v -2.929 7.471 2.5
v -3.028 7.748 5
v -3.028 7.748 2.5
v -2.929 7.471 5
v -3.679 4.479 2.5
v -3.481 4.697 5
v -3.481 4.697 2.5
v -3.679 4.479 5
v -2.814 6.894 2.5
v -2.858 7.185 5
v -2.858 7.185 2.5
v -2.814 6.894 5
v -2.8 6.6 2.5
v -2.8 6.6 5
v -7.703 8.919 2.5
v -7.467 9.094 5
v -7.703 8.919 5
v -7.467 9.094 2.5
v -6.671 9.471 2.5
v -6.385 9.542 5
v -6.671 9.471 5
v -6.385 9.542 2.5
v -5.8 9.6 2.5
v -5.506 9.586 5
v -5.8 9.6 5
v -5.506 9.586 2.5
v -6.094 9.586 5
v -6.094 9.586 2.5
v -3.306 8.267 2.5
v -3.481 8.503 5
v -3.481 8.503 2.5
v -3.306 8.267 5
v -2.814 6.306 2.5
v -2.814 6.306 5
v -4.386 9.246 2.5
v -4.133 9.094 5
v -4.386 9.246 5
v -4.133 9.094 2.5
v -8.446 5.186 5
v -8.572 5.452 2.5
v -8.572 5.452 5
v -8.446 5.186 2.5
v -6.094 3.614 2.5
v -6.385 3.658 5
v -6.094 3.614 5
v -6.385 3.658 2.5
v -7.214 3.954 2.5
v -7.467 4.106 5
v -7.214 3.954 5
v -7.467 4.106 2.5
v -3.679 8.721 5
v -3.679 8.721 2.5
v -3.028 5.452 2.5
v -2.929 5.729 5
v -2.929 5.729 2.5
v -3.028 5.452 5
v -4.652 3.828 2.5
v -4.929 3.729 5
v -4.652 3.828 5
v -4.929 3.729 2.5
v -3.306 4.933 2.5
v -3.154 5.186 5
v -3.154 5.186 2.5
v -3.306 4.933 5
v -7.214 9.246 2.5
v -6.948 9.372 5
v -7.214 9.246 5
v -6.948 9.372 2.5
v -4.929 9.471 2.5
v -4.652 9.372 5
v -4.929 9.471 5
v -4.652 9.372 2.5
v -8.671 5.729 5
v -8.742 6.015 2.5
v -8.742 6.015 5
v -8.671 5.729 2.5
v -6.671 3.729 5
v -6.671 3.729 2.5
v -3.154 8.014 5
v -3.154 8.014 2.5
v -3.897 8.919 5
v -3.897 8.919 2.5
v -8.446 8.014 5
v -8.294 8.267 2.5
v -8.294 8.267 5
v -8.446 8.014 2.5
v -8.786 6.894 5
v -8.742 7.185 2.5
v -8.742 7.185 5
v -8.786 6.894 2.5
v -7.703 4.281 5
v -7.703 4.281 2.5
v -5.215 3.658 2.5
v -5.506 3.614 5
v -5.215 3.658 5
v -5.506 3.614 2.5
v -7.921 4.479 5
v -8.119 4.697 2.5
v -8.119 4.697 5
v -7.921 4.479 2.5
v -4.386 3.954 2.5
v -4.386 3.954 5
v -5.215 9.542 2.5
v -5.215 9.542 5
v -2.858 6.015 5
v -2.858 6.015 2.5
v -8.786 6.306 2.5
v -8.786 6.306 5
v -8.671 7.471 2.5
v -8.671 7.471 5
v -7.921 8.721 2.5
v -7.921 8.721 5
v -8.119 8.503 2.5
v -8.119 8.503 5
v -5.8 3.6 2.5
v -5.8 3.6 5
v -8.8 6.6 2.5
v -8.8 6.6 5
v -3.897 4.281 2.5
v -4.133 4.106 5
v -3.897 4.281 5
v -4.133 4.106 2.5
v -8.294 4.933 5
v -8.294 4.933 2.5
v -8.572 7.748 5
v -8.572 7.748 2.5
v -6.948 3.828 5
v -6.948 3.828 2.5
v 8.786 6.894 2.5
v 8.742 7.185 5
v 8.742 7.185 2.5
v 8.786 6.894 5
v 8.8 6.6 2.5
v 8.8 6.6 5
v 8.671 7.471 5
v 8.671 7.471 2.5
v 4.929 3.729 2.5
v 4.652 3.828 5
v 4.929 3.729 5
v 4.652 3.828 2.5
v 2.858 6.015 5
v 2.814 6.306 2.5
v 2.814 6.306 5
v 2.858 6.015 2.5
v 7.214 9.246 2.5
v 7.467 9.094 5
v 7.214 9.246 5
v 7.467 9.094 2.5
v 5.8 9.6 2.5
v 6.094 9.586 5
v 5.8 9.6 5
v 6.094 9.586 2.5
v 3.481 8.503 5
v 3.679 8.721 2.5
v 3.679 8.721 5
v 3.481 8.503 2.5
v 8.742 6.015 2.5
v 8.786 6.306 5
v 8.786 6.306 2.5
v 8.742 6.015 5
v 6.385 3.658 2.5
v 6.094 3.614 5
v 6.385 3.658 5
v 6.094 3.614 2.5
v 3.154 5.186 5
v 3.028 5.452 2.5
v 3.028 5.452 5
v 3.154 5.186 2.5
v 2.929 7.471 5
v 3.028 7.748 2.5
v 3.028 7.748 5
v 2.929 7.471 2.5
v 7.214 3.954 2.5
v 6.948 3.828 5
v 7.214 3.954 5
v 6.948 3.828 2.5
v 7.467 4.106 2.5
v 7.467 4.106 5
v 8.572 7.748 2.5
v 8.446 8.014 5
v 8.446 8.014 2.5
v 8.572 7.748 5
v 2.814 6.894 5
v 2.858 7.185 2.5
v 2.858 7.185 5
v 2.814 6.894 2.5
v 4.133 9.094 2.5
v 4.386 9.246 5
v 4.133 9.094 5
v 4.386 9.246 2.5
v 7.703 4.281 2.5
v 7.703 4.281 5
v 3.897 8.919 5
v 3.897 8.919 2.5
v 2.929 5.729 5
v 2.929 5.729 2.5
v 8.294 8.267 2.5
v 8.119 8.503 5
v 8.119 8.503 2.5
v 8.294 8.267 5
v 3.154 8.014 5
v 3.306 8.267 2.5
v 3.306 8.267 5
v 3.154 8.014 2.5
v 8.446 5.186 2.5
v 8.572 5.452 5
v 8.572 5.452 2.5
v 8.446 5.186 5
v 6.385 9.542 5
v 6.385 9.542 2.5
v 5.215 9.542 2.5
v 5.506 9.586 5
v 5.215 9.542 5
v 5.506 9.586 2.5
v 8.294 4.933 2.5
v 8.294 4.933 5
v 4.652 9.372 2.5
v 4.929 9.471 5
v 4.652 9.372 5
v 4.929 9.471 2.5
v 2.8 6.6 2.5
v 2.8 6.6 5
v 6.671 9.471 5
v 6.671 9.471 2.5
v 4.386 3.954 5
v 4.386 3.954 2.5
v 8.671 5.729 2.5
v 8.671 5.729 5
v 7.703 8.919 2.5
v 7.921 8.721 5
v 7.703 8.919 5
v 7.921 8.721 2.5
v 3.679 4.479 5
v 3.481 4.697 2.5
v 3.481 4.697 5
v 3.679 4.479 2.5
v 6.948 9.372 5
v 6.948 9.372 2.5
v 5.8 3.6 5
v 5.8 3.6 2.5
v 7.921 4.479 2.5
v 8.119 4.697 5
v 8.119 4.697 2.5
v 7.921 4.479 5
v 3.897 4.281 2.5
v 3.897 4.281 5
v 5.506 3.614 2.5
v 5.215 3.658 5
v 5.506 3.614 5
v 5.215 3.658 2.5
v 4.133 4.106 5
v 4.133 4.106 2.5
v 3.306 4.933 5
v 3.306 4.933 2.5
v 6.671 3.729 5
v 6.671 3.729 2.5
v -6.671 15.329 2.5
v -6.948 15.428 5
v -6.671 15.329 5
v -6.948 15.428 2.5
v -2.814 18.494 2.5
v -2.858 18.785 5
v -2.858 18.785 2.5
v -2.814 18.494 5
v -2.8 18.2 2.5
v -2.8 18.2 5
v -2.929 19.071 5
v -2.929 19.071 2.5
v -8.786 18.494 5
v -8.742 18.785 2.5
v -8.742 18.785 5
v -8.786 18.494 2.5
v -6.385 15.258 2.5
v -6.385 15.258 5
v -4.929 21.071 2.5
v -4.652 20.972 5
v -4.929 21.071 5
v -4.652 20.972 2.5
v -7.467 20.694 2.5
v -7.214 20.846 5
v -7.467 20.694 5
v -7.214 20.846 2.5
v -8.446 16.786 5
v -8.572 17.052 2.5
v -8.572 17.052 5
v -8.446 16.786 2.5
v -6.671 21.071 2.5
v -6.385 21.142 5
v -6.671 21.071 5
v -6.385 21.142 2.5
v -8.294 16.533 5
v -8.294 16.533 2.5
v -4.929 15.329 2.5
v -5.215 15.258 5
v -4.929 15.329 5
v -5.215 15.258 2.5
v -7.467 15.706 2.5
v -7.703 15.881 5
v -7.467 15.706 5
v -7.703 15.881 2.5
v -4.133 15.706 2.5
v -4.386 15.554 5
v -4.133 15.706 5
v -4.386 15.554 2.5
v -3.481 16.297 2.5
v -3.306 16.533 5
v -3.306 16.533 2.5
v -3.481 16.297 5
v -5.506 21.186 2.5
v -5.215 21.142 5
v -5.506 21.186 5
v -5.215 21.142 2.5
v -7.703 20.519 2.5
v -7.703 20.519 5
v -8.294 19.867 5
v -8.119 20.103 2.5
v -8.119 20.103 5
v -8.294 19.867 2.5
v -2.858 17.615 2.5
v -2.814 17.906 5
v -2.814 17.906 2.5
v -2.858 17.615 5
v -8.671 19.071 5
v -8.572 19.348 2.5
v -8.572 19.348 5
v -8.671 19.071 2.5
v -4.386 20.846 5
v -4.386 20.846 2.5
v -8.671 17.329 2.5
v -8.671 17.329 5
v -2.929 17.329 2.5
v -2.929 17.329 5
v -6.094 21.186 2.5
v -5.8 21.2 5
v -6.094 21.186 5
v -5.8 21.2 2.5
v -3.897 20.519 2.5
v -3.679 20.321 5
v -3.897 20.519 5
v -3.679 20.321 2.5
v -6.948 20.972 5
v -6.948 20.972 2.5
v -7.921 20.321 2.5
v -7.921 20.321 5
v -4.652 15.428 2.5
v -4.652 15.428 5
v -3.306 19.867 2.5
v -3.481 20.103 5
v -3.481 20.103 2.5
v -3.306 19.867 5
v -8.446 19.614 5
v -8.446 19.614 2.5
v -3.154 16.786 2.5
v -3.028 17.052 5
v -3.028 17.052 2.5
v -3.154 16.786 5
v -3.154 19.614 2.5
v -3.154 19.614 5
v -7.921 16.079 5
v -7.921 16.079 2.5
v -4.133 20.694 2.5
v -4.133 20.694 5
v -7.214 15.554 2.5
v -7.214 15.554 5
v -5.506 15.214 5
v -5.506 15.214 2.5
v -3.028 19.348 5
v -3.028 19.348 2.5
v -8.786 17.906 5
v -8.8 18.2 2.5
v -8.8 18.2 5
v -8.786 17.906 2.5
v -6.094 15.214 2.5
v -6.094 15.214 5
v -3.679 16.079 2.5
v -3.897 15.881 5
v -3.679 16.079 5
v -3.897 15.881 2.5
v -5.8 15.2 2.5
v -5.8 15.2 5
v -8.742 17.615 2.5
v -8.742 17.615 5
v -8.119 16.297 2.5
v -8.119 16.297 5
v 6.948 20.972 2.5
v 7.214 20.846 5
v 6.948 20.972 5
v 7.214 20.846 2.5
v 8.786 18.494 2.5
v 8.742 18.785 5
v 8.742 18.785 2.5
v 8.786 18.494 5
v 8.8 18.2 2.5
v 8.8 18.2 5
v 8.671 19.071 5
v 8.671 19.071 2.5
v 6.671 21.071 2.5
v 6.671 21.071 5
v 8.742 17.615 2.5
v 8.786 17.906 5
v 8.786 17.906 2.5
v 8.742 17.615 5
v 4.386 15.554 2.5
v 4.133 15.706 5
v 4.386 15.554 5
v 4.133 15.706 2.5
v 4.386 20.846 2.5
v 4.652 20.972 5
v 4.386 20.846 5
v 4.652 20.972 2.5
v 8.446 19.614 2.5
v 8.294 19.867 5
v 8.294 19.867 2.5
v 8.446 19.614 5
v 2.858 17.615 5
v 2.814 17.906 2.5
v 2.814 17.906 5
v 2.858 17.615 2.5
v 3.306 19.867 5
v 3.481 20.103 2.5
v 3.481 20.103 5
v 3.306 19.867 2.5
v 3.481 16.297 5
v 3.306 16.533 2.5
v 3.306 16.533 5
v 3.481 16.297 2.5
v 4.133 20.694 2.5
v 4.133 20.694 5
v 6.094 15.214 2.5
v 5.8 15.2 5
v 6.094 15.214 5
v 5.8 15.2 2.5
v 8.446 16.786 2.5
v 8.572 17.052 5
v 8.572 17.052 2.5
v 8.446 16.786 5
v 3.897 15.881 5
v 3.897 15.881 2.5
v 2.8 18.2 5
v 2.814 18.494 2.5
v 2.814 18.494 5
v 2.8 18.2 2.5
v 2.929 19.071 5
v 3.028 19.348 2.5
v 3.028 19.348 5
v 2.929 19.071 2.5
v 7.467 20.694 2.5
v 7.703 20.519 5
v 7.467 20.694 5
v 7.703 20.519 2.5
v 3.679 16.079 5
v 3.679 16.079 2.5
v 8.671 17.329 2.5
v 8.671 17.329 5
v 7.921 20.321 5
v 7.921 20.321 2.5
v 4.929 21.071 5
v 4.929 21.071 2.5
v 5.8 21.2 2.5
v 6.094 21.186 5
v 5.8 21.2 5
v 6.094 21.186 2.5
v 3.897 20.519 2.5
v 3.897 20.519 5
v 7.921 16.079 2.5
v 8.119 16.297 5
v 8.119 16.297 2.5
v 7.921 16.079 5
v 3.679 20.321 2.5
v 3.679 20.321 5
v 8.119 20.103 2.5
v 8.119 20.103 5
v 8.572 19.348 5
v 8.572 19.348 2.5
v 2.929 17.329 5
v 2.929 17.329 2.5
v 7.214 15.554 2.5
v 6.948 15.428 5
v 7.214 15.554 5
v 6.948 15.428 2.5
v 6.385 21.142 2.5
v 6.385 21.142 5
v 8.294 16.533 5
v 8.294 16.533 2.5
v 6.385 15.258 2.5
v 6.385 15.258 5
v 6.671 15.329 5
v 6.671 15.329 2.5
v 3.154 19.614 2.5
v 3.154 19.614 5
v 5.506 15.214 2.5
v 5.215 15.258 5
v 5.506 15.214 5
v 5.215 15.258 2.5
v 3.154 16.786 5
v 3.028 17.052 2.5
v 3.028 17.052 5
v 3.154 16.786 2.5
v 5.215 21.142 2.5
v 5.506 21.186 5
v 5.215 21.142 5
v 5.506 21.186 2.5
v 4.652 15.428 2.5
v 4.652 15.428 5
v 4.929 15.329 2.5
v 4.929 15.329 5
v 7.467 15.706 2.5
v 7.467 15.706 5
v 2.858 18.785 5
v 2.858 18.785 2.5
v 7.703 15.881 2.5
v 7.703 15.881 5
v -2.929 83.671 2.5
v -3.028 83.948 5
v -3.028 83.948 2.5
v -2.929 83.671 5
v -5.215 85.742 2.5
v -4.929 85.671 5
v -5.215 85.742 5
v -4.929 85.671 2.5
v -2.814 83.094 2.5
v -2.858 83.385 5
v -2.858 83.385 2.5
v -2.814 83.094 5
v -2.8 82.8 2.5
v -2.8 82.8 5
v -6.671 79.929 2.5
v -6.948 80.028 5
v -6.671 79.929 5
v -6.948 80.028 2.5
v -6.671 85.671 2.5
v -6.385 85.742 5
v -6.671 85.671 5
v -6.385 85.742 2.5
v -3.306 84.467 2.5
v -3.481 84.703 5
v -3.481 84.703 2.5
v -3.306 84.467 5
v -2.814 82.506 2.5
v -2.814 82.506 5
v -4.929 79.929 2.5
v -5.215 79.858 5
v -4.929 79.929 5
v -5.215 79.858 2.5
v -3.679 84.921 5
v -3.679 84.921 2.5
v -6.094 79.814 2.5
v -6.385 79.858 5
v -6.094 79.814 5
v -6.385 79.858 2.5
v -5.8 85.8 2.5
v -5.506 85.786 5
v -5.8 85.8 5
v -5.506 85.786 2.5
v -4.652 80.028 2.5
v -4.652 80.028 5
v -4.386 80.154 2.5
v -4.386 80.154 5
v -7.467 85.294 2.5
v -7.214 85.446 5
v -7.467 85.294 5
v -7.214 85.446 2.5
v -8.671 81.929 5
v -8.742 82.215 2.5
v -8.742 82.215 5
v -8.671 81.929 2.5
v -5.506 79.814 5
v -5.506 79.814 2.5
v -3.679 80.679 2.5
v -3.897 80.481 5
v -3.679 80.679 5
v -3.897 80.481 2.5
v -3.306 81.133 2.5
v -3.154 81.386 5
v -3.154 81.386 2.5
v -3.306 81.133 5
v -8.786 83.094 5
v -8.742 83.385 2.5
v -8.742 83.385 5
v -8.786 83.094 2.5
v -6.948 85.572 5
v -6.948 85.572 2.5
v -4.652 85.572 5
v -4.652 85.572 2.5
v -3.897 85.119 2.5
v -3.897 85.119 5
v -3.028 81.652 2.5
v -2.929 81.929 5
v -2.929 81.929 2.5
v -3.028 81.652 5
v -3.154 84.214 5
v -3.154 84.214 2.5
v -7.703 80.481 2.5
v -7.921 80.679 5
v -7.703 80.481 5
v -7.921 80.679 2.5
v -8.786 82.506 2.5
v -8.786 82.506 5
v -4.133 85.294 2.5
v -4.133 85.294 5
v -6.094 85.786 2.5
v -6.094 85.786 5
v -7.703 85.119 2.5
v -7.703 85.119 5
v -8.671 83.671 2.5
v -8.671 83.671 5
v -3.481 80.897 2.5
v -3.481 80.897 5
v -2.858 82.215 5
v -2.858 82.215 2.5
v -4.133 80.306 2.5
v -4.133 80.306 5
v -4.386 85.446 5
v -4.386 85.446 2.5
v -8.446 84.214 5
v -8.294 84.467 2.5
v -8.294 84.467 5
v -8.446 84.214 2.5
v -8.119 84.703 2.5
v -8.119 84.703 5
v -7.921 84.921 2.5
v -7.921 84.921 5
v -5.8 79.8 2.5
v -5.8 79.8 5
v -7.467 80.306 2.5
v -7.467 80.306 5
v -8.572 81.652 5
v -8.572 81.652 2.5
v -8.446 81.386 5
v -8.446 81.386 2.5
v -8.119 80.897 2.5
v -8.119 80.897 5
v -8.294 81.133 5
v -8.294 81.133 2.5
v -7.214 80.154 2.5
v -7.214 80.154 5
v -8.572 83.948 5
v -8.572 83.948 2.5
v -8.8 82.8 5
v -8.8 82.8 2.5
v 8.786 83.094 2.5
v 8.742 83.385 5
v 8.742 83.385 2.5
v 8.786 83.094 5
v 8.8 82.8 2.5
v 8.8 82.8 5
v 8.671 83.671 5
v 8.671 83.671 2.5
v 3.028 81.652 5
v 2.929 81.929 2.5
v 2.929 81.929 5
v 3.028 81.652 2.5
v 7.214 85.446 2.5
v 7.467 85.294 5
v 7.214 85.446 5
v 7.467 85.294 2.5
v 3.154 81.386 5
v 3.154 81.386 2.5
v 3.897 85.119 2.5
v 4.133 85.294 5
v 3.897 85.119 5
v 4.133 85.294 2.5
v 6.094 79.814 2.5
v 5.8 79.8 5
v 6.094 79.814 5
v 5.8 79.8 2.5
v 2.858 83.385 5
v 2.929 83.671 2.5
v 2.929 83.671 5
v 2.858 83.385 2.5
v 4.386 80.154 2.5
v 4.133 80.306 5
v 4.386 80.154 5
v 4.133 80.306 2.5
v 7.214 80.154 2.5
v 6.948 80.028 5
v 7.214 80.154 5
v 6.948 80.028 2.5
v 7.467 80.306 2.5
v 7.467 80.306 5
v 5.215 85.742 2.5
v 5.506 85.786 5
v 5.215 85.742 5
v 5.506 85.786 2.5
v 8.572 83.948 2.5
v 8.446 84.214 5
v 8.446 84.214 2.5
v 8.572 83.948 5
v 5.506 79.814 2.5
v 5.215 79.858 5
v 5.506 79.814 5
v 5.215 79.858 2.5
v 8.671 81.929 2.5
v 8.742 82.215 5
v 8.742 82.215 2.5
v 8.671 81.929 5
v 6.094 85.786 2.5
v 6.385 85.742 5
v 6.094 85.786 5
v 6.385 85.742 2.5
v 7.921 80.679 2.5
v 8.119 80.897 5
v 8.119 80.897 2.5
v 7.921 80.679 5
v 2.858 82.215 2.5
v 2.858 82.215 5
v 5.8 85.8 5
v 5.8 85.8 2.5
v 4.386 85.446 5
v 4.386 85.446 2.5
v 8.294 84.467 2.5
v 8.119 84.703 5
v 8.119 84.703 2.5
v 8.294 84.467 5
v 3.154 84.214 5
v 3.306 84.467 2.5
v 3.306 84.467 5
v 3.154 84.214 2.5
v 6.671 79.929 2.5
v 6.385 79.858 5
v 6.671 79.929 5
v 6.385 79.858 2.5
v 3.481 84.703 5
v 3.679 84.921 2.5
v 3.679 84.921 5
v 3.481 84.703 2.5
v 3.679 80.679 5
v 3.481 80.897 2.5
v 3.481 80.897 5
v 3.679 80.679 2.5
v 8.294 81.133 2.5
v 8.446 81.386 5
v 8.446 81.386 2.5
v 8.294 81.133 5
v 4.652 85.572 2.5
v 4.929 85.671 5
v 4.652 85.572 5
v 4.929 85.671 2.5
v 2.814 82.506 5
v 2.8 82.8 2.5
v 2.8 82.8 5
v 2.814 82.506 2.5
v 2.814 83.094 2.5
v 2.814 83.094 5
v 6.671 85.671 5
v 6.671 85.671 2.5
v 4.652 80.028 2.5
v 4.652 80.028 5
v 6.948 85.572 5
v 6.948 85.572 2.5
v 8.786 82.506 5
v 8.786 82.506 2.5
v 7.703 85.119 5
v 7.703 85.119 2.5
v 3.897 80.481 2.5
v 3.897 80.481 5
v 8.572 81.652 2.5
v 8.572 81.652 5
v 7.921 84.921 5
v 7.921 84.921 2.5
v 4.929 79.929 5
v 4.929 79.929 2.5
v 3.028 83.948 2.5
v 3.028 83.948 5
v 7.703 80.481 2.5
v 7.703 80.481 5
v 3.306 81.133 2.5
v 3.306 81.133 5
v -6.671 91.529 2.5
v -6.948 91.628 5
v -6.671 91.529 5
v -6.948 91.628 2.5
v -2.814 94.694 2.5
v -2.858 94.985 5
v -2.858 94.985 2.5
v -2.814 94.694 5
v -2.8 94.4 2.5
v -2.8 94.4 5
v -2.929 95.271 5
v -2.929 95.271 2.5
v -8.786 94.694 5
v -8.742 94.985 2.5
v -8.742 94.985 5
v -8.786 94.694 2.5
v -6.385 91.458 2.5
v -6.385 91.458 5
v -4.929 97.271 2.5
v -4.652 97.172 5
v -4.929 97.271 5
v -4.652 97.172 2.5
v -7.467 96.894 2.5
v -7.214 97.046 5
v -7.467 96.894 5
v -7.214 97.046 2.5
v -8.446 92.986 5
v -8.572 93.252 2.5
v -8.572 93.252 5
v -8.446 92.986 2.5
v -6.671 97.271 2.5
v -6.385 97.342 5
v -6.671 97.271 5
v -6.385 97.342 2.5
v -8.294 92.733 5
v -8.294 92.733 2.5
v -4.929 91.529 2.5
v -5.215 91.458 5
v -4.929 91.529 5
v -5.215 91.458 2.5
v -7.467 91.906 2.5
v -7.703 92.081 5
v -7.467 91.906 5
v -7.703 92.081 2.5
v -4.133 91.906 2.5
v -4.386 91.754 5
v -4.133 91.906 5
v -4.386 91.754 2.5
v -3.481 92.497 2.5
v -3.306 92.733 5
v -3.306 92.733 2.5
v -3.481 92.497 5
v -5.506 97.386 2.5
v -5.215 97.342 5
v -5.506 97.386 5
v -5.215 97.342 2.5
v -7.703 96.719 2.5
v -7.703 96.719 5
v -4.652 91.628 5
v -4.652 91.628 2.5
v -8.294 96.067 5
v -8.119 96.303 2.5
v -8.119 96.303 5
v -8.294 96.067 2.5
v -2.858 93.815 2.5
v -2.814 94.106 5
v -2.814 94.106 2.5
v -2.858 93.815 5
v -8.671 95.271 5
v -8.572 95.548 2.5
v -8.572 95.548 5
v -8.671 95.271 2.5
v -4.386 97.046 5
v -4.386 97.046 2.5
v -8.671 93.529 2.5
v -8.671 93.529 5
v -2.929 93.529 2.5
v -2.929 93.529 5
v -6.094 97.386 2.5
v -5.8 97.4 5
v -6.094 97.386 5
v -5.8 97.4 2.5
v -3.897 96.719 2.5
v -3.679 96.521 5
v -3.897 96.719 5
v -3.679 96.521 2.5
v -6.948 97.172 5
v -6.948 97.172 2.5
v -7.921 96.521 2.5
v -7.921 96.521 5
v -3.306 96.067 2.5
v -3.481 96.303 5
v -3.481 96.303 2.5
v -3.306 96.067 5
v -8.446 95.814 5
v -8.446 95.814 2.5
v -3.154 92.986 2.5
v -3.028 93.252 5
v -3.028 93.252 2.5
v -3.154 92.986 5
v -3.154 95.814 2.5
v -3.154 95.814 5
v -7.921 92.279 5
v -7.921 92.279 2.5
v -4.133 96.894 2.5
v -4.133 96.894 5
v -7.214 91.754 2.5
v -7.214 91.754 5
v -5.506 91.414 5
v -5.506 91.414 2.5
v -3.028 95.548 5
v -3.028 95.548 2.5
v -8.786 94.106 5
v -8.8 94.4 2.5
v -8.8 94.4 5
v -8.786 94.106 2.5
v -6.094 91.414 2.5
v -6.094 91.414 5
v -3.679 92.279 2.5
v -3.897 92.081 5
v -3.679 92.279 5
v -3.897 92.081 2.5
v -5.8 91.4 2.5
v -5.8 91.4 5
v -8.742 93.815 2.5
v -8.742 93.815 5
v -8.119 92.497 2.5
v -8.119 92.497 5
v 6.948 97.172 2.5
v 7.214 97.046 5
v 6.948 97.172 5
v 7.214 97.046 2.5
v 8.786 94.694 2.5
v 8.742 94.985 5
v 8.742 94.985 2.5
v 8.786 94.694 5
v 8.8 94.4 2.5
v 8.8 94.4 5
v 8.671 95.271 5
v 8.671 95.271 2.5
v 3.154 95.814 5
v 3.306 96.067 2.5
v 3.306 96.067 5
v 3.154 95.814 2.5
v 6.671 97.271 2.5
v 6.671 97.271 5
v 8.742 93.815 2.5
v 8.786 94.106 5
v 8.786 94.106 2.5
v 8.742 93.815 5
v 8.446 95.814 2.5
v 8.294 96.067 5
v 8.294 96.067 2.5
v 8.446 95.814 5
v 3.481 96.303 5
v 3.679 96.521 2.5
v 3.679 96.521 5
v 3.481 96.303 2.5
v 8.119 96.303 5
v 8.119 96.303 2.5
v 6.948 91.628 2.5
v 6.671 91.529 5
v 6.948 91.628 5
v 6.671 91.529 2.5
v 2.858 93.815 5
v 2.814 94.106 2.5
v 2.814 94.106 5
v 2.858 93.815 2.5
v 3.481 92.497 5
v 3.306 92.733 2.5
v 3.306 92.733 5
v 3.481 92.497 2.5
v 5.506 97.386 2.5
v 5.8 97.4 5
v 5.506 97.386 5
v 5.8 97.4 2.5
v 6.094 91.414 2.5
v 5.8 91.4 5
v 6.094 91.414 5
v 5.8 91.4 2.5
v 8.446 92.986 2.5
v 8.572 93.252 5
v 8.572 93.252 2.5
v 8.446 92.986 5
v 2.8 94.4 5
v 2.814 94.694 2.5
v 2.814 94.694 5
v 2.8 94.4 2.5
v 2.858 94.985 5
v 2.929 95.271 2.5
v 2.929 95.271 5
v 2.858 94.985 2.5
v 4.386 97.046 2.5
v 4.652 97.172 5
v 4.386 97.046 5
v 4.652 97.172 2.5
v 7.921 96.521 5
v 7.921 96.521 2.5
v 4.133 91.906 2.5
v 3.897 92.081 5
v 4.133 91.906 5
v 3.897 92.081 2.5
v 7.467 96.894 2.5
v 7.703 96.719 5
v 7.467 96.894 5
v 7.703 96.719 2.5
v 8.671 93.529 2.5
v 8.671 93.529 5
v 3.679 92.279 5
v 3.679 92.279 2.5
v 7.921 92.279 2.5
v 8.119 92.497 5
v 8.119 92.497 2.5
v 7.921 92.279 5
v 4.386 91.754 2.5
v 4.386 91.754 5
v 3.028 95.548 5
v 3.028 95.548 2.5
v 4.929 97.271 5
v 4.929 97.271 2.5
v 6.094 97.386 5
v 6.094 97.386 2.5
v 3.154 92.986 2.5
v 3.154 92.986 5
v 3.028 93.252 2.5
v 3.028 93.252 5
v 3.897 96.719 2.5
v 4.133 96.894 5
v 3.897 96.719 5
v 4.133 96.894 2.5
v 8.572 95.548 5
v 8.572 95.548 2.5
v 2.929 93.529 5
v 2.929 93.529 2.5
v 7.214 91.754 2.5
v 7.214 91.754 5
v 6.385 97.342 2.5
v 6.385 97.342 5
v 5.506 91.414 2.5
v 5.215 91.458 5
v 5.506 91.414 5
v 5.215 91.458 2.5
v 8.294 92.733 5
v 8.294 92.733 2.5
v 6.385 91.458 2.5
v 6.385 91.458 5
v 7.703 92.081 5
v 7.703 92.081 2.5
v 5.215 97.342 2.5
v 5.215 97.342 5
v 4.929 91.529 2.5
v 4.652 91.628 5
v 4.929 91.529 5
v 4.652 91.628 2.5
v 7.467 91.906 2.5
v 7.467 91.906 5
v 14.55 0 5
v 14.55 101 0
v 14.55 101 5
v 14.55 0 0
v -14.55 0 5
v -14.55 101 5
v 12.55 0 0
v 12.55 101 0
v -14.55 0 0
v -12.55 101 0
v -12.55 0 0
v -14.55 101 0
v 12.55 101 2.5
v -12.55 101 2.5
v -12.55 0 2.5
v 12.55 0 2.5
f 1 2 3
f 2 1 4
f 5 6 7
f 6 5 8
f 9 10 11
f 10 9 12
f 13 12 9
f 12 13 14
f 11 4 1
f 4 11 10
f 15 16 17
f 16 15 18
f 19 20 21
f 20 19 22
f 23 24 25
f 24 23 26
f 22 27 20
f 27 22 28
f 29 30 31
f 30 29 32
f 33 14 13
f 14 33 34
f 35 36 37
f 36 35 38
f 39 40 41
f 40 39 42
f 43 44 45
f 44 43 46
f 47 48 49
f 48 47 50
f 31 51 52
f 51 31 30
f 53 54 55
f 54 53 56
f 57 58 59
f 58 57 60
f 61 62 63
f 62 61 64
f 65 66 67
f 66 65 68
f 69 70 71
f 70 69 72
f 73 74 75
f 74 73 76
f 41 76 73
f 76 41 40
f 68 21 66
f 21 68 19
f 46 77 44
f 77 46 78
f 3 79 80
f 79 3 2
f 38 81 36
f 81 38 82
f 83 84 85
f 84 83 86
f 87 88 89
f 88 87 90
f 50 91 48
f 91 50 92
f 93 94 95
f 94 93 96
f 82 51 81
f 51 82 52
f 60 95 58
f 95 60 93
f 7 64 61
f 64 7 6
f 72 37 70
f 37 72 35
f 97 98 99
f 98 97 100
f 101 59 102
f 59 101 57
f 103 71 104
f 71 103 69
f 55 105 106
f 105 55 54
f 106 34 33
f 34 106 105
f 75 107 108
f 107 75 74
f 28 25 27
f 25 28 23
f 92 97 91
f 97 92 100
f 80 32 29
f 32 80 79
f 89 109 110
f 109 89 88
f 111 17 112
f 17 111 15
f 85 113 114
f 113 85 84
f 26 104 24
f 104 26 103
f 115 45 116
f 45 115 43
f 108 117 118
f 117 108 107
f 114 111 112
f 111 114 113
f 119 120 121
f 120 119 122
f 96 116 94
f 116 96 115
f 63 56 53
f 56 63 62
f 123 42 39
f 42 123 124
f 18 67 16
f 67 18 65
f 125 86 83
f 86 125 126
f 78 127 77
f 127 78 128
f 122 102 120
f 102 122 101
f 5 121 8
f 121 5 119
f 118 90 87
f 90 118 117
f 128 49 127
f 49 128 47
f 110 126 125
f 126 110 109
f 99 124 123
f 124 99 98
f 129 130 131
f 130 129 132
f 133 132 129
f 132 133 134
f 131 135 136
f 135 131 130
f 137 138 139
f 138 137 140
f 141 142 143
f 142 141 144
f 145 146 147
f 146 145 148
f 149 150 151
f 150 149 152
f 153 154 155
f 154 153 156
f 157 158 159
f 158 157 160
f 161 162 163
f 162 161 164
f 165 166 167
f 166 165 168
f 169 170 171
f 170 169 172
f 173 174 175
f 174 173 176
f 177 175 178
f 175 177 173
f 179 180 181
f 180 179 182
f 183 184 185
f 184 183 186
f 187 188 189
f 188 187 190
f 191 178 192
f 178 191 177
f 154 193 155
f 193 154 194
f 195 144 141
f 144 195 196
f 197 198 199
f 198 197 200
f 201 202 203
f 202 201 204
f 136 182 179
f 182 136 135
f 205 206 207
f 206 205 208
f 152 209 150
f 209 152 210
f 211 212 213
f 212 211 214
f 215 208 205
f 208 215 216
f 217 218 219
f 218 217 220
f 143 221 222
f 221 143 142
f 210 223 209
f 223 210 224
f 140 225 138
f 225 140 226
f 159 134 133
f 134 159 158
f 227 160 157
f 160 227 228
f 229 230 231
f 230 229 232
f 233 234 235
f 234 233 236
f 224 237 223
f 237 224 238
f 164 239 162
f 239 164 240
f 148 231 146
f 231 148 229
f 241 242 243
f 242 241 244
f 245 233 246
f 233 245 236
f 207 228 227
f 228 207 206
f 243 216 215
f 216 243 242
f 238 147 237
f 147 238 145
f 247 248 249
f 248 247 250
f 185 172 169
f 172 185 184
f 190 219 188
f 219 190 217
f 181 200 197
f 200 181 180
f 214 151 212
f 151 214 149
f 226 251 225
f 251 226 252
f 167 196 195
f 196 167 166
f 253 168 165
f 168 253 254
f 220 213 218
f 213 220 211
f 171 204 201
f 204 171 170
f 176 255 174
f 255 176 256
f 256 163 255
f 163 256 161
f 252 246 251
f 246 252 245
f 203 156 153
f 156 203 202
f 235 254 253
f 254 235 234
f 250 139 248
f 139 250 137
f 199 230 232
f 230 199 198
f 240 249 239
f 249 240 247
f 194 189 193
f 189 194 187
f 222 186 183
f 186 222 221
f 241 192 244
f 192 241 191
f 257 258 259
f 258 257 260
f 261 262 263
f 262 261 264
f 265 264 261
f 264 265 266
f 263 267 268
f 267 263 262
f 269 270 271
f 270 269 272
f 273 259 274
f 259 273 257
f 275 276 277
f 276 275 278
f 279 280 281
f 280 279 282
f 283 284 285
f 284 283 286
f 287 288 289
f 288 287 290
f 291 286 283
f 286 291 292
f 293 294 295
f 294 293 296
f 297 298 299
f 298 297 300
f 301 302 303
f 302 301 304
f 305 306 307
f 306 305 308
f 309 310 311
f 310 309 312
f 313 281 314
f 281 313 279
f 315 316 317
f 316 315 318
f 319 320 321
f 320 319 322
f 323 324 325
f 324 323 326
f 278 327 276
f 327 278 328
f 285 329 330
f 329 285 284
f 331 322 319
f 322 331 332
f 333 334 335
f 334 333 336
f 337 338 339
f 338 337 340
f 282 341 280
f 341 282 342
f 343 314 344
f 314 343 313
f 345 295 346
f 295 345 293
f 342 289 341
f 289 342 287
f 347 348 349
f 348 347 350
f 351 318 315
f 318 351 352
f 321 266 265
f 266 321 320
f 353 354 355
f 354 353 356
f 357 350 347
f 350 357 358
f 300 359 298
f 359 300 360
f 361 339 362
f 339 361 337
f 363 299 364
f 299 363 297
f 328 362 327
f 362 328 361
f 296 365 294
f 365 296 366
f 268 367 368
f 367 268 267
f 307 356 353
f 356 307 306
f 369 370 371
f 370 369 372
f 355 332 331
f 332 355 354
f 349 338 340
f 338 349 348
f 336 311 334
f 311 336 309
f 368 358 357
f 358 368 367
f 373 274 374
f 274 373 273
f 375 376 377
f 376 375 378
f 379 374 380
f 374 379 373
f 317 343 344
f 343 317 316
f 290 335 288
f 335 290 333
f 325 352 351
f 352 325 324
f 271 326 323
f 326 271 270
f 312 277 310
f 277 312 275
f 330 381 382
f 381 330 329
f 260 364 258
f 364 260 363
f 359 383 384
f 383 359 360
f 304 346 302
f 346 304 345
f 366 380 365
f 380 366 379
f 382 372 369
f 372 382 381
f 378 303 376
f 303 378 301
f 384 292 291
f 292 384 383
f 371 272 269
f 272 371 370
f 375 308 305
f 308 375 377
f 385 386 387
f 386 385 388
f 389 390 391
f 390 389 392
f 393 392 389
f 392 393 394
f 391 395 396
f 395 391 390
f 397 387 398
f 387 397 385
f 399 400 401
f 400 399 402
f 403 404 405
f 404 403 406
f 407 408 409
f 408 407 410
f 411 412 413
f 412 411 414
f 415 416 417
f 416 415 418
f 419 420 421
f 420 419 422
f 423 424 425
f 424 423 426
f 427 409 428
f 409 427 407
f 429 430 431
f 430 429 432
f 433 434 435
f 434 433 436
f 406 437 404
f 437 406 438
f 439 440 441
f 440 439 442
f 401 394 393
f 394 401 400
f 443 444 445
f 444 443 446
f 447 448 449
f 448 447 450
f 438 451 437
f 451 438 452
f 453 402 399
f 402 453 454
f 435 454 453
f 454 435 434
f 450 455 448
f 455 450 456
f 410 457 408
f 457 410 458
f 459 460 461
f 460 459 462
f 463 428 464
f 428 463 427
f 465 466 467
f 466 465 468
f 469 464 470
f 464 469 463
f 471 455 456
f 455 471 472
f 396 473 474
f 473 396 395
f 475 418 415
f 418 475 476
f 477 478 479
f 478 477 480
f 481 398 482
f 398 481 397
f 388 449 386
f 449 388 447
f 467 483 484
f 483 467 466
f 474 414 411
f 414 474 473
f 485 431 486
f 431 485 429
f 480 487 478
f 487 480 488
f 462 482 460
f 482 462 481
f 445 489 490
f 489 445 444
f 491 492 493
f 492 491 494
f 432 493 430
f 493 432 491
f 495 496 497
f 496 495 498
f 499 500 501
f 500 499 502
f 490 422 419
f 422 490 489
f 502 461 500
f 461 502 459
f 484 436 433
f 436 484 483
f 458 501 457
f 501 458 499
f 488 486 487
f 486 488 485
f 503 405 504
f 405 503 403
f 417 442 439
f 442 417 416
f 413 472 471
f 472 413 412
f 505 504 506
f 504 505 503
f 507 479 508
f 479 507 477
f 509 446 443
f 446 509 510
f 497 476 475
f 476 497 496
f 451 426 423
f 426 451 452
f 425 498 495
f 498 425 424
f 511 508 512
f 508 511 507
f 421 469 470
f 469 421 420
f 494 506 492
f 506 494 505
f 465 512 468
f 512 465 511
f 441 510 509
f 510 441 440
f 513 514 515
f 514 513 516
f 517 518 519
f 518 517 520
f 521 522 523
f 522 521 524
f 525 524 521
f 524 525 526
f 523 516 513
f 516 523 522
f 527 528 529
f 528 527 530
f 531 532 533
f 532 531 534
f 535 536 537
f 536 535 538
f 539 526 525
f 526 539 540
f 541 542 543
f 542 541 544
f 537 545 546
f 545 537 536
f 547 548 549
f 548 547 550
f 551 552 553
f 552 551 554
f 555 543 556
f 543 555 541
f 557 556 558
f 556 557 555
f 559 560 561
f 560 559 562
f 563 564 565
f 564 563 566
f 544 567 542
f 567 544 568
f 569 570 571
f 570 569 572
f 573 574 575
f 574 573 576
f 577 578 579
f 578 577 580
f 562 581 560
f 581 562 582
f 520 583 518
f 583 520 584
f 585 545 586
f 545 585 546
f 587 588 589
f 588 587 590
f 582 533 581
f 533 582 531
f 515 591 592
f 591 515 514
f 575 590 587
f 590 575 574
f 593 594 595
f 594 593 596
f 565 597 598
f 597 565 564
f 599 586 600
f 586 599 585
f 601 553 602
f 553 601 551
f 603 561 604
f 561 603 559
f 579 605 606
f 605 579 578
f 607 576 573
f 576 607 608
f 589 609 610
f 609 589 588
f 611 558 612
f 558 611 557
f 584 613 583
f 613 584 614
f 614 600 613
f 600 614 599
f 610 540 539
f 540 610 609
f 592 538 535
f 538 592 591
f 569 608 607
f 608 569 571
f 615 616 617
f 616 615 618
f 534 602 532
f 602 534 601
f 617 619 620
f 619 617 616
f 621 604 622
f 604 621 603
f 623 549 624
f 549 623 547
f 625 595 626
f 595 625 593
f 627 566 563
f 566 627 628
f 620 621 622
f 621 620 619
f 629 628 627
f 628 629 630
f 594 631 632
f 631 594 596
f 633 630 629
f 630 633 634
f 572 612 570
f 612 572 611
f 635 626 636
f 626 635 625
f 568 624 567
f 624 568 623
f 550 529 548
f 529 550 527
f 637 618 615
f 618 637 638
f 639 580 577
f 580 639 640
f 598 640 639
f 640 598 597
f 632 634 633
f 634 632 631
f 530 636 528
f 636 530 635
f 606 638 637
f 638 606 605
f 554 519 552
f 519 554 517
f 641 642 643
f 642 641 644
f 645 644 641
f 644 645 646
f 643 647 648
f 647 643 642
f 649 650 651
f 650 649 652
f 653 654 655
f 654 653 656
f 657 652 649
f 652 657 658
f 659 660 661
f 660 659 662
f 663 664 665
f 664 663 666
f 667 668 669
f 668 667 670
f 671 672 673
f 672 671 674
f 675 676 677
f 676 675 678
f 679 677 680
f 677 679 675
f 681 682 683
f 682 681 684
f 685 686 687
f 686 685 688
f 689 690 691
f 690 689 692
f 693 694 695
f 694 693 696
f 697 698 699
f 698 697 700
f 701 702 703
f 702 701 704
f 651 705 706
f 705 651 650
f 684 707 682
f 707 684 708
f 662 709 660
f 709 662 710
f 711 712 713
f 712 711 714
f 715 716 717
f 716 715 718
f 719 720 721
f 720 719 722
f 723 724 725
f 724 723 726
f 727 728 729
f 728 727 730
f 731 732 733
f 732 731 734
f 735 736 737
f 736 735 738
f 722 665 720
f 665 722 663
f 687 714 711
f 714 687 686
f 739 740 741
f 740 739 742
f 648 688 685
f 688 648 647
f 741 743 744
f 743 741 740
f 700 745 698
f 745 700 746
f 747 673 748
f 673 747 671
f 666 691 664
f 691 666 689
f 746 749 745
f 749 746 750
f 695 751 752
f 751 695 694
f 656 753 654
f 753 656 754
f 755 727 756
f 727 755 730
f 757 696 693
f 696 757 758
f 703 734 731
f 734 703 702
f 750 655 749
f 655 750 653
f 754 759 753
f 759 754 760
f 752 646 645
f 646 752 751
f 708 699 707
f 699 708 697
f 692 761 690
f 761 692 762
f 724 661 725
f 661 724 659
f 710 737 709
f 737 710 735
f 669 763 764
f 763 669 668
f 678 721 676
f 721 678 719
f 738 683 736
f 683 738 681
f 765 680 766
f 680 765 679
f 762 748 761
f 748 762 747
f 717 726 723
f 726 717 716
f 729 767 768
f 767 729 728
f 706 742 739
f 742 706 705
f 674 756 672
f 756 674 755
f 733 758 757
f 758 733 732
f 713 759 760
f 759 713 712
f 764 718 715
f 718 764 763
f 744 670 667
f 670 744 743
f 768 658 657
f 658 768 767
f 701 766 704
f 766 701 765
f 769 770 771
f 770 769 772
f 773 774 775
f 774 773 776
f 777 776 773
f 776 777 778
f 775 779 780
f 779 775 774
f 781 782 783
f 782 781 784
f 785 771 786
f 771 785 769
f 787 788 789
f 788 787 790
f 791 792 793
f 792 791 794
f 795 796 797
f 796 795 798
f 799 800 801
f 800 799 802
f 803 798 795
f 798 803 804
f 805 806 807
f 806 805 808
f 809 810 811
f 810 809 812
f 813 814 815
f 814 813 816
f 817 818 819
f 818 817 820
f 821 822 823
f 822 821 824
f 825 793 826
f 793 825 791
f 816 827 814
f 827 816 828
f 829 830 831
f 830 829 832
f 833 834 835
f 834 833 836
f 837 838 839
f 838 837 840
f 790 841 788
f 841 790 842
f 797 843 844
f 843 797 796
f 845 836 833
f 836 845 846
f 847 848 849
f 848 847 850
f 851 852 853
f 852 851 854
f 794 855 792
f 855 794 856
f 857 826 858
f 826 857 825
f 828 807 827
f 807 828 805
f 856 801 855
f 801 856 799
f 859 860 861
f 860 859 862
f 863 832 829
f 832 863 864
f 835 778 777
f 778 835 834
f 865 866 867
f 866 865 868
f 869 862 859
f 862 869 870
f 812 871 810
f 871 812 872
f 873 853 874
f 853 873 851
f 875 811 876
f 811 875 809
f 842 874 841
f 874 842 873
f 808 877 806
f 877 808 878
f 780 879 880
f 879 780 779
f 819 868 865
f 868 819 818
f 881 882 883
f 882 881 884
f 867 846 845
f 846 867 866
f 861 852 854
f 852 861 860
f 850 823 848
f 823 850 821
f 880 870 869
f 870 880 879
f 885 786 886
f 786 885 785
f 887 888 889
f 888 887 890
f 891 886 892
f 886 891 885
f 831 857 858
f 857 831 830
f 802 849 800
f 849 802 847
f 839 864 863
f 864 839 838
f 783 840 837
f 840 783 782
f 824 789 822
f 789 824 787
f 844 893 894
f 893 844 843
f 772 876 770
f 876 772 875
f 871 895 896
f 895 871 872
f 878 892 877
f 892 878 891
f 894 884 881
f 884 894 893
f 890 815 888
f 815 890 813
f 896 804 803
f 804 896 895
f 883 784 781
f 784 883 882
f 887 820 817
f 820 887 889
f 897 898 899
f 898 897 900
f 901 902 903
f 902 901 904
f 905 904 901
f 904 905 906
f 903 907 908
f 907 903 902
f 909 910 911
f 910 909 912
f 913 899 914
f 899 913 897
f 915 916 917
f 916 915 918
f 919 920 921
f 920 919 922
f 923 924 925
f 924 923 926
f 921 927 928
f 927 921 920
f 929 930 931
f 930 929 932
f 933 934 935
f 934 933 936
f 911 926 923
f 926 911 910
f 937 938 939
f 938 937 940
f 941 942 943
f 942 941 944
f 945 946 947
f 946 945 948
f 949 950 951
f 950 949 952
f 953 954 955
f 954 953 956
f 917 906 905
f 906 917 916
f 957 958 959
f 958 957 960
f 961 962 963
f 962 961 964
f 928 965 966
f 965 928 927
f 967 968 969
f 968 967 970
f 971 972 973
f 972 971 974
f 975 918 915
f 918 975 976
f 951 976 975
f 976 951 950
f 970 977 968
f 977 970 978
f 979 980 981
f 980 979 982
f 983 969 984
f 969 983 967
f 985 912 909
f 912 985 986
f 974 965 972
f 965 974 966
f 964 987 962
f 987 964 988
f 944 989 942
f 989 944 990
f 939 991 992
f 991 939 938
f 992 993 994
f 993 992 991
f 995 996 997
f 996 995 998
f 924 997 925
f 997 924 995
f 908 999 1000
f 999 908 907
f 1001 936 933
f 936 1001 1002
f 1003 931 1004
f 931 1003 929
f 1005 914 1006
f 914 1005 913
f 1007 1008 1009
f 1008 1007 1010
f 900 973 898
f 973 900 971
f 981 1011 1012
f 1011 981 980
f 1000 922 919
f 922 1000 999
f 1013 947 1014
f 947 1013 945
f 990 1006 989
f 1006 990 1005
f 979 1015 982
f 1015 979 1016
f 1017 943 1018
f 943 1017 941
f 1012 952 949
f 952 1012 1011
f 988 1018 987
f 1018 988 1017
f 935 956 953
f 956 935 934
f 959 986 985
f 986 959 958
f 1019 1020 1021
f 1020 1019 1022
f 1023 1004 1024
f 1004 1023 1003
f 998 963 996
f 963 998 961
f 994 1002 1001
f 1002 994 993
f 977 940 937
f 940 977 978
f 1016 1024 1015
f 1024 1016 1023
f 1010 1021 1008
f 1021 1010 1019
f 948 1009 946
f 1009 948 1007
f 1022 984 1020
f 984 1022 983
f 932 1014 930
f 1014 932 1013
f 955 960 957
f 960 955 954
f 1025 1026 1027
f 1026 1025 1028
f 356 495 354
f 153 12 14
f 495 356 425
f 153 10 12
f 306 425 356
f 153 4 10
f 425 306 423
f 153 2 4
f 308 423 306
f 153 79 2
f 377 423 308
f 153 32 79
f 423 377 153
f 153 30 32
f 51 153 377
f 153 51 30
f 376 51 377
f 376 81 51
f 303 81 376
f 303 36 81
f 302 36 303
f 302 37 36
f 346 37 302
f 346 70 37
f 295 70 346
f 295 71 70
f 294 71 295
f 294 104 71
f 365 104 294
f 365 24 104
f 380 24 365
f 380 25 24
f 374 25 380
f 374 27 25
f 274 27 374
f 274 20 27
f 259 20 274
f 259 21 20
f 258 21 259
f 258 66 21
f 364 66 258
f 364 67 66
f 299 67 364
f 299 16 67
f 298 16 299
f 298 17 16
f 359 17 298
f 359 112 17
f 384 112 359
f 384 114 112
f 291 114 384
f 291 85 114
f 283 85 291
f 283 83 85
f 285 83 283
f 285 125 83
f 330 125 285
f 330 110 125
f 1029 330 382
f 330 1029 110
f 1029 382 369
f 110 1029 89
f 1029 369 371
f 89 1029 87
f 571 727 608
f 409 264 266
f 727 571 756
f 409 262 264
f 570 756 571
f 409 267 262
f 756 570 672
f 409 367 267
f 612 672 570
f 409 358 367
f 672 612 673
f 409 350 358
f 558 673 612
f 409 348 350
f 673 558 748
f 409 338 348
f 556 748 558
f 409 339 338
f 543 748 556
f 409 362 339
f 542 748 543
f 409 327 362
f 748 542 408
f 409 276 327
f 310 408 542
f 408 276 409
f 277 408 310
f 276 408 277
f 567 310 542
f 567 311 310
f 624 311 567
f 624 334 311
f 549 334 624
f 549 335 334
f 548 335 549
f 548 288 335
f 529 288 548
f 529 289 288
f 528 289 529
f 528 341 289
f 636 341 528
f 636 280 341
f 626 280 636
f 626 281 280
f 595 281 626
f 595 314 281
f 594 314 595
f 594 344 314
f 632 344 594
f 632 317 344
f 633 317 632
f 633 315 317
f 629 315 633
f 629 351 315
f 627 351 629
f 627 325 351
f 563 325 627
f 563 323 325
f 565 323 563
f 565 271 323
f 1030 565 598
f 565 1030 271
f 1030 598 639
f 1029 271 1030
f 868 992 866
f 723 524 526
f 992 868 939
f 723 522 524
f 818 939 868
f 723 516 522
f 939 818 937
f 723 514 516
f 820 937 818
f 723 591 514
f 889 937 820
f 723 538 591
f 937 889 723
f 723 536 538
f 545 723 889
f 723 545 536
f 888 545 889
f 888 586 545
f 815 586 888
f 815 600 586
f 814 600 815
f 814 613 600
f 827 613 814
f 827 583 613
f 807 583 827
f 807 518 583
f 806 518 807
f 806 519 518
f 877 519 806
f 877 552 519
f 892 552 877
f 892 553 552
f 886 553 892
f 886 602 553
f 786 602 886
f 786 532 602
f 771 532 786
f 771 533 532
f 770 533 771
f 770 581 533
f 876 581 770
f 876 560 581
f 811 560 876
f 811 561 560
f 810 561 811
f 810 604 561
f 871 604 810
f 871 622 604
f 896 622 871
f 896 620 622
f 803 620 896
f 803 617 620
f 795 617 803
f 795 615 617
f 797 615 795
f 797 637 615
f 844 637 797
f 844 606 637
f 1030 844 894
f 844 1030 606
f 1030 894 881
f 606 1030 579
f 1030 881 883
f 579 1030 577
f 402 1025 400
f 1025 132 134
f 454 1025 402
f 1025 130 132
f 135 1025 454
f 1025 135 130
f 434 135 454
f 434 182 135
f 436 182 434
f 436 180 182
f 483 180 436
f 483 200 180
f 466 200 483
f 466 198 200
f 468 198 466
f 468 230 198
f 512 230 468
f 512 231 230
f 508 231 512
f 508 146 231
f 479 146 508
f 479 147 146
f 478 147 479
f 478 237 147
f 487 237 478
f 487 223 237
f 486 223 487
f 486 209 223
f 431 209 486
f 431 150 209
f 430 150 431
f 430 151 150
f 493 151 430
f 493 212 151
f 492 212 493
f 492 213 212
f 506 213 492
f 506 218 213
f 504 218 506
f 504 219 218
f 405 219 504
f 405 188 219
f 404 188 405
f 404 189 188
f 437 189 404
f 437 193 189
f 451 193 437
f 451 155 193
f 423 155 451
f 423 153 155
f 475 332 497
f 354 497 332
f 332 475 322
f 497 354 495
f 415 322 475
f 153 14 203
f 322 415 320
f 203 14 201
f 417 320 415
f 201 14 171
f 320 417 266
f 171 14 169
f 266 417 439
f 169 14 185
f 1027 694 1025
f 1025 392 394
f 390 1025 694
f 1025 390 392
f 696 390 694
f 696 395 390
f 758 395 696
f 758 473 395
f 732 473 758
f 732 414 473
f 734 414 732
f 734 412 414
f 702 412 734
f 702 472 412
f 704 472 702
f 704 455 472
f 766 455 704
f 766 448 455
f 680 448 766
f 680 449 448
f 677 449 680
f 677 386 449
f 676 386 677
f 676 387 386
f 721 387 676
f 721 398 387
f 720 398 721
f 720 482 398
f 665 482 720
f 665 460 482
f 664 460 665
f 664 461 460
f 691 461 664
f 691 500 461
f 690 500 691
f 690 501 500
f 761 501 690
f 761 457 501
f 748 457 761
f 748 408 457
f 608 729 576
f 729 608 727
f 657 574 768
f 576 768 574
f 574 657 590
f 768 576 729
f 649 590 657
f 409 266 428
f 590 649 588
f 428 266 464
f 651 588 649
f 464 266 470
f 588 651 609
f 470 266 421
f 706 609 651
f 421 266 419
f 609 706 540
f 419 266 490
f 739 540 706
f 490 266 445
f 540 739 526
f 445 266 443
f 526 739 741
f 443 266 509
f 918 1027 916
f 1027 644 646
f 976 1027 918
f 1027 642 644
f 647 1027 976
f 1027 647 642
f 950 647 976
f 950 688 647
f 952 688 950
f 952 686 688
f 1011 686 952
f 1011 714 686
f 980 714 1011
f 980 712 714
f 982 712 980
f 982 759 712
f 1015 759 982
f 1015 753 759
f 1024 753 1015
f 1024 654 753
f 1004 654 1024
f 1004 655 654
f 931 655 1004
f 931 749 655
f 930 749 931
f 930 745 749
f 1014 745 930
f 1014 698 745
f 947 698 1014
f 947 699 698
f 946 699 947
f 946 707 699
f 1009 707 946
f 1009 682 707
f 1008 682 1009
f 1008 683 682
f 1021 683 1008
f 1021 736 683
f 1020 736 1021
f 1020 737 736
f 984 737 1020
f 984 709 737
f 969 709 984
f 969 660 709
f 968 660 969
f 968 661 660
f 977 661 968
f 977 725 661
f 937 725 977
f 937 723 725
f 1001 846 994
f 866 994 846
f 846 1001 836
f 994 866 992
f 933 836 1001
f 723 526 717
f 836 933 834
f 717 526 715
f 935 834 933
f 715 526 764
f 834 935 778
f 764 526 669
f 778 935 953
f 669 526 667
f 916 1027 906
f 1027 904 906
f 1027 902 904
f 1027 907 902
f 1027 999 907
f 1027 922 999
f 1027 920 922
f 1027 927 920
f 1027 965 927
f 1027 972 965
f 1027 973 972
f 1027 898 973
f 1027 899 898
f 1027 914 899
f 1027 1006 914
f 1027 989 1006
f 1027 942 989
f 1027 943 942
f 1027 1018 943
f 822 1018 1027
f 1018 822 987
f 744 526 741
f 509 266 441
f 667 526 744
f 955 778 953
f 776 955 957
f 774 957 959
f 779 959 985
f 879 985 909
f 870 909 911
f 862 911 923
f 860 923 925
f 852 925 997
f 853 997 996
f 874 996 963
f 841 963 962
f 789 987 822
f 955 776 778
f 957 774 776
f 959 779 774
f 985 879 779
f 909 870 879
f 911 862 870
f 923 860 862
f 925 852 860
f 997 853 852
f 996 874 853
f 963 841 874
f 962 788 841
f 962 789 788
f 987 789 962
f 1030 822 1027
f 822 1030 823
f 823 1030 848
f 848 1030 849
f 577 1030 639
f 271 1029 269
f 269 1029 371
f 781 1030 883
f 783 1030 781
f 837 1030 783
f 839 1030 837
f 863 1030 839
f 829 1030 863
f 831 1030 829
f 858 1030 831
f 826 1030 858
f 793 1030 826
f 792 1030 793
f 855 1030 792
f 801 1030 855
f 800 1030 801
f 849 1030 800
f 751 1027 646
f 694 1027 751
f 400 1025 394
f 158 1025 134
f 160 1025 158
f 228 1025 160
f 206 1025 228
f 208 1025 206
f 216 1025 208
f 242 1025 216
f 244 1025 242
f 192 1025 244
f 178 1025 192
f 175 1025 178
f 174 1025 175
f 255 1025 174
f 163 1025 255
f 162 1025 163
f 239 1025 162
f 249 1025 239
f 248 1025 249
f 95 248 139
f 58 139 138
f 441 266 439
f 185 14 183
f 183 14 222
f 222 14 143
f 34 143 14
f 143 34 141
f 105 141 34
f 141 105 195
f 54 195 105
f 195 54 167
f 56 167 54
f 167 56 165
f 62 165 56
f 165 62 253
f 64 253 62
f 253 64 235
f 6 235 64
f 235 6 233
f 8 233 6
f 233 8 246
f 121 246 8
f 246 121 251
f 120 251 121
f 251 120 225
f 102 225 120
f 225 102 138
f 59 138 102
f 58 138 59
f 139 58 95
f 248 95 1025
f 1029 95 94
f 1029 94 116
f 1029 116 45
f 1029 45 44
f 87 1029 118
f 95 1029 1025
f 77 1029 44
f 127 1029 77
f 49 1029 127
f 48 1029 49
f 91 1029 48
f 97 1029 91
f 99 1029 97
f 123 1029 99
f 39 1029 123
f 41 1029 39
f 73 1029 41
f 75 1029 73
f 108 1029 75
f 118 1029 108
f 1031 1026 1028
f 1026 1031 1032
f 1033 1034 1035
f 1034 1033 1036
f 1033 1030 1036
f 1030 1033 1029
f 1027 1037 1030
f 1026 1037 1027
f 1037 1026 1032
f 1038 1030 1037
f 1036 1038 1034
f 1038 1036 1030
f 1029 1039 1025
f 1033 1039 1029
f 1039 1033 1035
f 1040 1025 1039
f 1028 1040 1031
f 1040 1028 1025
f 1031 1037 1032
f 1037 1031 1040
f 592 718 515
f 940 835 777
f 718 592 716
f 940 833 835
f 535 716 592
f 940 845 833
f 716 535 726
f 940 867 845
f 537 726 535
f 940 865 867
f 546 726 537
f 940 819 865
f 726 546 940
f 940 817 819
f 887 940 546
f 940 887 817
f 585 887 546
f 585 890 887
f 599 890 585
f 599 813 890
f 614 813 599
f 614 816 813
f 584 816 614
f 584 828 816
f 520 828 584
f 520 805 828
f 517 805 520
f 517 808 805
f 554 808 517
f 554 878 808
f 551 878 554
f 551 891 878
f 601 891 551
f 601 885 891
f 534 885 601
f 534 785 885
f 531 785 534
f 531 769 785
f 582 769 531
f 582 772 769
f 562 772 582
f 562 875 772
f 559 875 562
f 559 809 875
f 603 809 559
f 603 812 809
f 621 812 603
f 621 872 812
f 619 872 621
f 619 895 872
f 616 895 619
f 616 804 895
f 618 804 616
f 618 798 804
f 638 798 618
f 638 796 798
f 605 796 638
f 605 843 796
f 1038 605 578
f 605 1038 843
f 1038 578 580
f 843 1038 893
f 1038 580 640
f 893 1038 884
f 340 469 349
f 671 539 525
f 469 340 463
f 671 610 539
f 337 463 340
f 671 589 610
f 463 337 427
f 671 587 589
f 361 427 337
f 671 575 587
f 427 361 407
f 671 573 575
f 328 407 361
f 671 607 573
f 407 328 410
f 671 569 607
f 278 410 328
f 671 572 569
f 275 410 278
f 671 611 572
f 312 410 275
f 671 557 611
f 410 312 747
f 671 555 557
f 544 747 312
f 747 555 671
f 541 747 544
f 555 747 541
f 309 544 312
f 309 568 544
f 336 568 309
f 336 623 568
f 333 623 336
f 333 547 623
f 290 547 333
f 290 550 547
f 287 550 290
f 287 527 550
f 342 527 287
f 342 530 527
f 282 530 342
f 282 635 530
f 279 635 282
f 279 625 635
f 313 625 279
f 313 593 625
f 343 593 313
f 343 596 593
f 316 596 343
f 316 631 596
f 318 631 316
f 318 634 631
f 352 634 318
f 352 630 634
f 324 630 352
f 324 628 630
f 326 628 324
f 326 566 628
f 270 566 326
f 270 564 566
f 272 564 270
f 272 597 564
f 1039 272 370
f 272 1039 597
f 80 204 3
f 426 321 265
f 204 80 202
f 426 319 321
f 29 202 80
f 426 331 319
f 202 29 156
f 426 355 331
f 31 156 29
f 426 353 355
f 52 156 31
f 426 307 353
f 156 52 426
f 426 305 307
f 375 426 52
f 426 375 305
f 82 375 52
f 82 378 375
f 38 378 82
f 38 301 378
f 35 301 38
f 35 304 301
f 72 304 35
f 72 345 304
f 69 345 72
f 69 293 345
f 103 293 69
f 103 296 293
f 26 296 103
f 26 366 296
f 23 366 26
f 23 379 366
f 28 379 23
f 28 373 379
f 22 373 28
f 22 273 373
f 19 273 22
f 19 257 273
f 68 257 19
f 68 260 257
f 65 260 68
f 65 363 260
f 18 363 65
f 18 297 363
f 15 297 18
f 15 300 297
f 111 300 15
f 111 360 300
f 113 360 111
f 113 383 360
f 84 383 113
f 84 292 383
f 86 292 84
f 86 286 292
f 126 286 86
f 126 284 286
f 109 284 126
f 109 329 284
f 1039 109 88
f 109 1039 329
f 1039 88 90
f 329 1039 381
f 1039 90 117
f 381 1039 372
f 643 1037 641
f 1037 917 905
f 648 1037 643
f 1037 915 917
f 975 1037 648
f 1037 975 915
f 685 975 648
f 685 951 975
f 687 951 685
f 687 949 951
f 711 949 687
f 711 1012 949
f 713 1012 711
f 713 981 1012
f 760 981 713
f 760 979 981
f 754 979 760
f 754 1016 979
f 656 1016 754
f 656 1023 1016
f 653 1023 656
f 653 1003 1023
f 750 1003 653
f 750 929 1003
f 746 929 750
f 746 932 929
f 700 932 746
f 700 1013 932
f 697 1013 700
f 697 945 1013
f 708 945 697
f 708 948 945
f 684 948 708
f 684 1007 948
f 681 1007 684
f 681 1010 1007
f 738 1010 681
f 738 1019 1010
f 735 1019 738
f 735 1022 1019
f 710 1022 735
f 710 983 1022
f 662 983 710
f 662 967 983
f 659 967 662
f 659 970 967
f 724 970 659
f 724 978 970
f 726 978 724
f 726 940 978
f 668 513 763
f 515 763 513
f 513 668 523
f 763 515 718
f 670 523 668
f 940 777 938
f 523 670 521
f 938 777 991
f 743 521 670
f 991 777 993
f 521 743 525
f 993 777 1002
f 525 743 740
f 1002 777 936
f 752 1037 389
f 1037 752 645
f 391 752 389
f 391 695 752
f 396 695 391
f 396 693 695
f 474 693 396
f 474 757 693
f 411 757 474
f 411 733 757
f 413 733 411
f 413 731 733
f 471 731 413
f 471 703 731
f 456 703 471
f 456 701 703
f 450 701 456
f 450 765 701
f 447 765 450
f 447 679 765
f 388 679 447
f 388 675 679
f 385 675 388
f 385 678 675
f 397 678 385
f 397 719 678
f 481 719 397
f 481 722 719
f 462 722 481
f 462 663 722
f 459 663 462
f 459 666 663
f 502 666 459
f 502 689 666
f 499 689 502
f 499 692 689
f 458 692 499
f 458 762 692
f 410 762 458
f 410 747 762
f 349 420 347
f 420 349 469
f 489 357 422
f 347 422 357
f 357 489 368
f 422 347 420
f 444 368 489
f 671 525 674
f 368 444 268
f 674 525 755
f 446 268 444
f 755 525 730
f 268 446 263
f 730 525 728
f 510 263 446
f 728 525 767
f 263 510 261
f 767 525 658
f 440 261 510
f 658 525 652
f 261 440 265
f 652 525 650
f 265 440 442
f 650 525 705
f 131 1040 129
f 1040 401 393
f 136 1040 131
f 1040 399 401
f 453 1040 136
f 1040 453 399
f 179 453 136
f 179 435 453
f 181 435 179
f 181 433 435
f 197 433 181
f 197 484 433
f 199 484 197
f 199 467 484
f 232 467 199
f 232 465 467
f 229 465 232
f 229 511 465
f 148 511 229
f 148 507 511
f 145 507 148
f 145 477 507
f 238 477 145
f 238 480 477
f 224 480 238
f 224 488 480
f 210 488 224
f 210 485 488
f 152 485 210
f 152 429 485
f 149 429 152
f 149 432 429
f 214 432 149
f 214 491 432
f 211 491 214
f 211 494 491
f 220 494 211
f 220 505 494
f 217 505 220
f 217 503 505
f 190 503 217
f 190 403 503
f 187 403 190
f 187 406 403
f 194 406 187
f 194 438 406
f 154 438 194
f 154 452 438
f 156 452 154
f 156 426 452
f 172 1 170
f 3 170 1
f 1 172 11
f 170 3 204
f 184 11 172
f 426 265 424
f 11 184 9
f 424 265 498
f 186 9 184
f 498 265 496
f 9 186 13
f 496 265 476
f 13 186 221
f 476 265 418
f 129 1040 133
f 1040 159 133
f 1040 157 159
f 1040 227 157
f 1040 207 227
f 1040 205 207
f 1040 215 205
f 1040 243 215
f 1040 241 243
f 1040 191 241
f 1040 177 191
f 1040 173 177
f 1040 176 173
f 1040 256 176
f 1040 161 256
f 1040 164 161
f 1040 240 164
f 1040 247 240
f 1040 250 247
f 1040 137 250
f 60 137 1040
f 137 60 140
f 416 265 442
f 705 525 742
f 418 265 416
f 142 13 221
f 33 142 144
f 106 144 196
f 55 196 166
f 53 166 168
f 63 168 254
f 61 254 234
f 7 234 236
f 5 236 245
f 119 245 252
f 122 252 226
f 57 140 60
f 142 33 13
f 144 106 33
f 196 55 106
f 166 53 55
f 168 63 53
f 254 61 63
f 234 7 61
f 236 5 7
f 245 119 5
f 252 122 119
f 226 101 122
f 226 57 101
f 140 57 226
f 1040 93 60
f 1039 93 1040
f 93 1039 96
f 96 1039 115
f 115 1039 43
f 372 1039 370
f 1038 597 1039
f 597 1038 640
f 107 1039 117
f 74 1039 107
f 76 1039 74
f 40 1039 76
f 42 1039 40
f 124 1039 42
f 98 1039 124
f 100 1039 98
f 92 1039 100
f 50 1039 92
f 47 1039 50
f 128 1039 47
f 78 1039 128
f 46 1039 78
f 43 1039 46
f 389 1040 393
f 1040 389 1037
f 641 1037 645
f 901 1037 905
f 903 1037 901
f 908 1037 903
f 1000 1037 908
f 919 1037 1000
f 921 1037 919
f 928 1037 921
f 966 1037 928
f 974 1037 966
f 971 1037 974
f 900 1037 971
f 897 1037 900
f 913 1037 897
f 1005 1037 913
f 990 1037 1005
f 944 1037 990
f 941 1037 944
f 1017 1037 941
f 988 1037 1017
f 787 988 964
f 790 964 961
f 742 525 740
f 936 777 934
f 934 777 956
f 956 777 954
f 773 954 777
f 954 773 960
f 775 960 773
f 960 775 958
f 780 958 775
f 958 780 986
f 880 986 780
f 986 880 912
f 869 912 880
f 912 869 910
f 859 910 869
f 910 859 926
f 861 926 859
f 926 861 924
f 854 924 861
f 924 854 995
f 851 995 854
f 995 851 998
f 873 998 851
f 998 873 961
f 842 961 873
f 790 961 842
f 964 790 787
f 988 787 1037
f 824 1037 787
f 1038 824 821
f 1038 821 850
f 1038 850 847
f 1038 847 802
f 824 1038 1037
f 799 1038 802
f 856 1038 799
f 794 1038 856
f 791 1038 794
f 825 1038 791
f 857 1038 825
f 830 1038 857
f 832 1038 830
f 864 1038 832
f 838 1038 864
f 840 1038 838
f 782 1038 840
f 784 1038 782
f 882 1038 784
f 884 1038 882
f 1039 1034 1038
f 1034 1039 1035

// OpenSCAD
// file: lib/leash-jig.scad
// Copyright (c) 2026 mmmaxwwwell
// Licensed under CC BY-NC-ND 4.0, https://creativecommons.org/licenses/by-nc-nd/4.0/
//
// Shared geometry for BioThane leash hole-punch jigs.
// One channel-cross-section, any length, with 2-hole rows at arbitrary Y
// positions. A "4-hole square" is just two rows 11.6mm apart.

// ===== Strap =====
strap_width      = 24.8;
strap_thickness  = 2.5;

// ===== Chicago screw / hole pattern =====
// Holes are 6mm but caps are 10mm, so spacing is driven by cap geometry.
//   3*gap + 2*cap_d = strap_width  →  gap = 1.6mm
hole_d           = 6.0;
cap_d            = 10.0;
gap              = (strap_width - 2 * cap_d) / 3;   // 1.6 mm
hole_pitch       = cap_d + gap;                     // 11.6 mm, center-to-center
edge_to_center   = gap + cap_d / 2;                 //  6.6 mm

// ===== Jig cross-section =====
wall              = 2.0;
jig_thickness     = 2 * strap_thickness;            // 5 mm
channel_clearance = 0.3;
channel_w         = strap_width + channel_clearance;
channel_d         = strap_thickness;
jig_w             = channel_w + 2 * wall;

inch              = 25.4;
eps               = 0.01;

// Punch jig with a 2-hole row at every Y in `hole_ys`.
// Holes sit at X = ±hole_pitch/2 (centered in the channel).
// Channel opens DOWNWARD (toward Z=0, the build plate).
module leash_jig(length, hole_ys) {
    difference() {
        translate([-jig_w/2, 0, 0])
            cube([jig_w, length, jig_thickness]);

        // Strap channel — open on both Y ends; opens DOWNWARD (Z=0 face)
        translate([-channel_w/2, -eps, -eps])
            cube([channel_w, length + 2*eps, channel_d + eps]);

        // Punch-guide holes
        for (y = hole_ys)
            for (x = [-hole_pitch/2, hole_pitch/2])
                translate([x, y, -eps])
                    cylinder(d = hole_d, h = jig_thickness + 2*eps);
    }
}
// main file
// Copyright (c) 2026 mmmaxwwwell
// Licensed under CC BY-NC-ND 4.0, https://creativecommons.org/licenses/by-nc-nd/4.0/
//
// 2-foot leash, carabiner end. Same as the cobra end but second square's
// inner edge is 3" from the strap end (one inch less than the cobra end).

include <lib/leash-jig.scad>

$fn = 64;

inner_edge_in = 3;
inner_edge = inner_edge_in * inch;                       // 76.2

end_y0 = edge_to_center;                                 //   6.6
end_y1 = edge_to_center + hole_pitch;                    //  18.2
sec_y0 = inner_edge + edge_to_center;                    //  82.8
sec_y1 = inner_edge + edge_to_center + hole_pitch;       //  94.4

jig_len = sec_y1 + edge_to_center;                       // 101.0

leash_jig(
    length  = jig_len,
    hole_ys = [end_y0, end_y1, sec_y0, sec_y1]
);
